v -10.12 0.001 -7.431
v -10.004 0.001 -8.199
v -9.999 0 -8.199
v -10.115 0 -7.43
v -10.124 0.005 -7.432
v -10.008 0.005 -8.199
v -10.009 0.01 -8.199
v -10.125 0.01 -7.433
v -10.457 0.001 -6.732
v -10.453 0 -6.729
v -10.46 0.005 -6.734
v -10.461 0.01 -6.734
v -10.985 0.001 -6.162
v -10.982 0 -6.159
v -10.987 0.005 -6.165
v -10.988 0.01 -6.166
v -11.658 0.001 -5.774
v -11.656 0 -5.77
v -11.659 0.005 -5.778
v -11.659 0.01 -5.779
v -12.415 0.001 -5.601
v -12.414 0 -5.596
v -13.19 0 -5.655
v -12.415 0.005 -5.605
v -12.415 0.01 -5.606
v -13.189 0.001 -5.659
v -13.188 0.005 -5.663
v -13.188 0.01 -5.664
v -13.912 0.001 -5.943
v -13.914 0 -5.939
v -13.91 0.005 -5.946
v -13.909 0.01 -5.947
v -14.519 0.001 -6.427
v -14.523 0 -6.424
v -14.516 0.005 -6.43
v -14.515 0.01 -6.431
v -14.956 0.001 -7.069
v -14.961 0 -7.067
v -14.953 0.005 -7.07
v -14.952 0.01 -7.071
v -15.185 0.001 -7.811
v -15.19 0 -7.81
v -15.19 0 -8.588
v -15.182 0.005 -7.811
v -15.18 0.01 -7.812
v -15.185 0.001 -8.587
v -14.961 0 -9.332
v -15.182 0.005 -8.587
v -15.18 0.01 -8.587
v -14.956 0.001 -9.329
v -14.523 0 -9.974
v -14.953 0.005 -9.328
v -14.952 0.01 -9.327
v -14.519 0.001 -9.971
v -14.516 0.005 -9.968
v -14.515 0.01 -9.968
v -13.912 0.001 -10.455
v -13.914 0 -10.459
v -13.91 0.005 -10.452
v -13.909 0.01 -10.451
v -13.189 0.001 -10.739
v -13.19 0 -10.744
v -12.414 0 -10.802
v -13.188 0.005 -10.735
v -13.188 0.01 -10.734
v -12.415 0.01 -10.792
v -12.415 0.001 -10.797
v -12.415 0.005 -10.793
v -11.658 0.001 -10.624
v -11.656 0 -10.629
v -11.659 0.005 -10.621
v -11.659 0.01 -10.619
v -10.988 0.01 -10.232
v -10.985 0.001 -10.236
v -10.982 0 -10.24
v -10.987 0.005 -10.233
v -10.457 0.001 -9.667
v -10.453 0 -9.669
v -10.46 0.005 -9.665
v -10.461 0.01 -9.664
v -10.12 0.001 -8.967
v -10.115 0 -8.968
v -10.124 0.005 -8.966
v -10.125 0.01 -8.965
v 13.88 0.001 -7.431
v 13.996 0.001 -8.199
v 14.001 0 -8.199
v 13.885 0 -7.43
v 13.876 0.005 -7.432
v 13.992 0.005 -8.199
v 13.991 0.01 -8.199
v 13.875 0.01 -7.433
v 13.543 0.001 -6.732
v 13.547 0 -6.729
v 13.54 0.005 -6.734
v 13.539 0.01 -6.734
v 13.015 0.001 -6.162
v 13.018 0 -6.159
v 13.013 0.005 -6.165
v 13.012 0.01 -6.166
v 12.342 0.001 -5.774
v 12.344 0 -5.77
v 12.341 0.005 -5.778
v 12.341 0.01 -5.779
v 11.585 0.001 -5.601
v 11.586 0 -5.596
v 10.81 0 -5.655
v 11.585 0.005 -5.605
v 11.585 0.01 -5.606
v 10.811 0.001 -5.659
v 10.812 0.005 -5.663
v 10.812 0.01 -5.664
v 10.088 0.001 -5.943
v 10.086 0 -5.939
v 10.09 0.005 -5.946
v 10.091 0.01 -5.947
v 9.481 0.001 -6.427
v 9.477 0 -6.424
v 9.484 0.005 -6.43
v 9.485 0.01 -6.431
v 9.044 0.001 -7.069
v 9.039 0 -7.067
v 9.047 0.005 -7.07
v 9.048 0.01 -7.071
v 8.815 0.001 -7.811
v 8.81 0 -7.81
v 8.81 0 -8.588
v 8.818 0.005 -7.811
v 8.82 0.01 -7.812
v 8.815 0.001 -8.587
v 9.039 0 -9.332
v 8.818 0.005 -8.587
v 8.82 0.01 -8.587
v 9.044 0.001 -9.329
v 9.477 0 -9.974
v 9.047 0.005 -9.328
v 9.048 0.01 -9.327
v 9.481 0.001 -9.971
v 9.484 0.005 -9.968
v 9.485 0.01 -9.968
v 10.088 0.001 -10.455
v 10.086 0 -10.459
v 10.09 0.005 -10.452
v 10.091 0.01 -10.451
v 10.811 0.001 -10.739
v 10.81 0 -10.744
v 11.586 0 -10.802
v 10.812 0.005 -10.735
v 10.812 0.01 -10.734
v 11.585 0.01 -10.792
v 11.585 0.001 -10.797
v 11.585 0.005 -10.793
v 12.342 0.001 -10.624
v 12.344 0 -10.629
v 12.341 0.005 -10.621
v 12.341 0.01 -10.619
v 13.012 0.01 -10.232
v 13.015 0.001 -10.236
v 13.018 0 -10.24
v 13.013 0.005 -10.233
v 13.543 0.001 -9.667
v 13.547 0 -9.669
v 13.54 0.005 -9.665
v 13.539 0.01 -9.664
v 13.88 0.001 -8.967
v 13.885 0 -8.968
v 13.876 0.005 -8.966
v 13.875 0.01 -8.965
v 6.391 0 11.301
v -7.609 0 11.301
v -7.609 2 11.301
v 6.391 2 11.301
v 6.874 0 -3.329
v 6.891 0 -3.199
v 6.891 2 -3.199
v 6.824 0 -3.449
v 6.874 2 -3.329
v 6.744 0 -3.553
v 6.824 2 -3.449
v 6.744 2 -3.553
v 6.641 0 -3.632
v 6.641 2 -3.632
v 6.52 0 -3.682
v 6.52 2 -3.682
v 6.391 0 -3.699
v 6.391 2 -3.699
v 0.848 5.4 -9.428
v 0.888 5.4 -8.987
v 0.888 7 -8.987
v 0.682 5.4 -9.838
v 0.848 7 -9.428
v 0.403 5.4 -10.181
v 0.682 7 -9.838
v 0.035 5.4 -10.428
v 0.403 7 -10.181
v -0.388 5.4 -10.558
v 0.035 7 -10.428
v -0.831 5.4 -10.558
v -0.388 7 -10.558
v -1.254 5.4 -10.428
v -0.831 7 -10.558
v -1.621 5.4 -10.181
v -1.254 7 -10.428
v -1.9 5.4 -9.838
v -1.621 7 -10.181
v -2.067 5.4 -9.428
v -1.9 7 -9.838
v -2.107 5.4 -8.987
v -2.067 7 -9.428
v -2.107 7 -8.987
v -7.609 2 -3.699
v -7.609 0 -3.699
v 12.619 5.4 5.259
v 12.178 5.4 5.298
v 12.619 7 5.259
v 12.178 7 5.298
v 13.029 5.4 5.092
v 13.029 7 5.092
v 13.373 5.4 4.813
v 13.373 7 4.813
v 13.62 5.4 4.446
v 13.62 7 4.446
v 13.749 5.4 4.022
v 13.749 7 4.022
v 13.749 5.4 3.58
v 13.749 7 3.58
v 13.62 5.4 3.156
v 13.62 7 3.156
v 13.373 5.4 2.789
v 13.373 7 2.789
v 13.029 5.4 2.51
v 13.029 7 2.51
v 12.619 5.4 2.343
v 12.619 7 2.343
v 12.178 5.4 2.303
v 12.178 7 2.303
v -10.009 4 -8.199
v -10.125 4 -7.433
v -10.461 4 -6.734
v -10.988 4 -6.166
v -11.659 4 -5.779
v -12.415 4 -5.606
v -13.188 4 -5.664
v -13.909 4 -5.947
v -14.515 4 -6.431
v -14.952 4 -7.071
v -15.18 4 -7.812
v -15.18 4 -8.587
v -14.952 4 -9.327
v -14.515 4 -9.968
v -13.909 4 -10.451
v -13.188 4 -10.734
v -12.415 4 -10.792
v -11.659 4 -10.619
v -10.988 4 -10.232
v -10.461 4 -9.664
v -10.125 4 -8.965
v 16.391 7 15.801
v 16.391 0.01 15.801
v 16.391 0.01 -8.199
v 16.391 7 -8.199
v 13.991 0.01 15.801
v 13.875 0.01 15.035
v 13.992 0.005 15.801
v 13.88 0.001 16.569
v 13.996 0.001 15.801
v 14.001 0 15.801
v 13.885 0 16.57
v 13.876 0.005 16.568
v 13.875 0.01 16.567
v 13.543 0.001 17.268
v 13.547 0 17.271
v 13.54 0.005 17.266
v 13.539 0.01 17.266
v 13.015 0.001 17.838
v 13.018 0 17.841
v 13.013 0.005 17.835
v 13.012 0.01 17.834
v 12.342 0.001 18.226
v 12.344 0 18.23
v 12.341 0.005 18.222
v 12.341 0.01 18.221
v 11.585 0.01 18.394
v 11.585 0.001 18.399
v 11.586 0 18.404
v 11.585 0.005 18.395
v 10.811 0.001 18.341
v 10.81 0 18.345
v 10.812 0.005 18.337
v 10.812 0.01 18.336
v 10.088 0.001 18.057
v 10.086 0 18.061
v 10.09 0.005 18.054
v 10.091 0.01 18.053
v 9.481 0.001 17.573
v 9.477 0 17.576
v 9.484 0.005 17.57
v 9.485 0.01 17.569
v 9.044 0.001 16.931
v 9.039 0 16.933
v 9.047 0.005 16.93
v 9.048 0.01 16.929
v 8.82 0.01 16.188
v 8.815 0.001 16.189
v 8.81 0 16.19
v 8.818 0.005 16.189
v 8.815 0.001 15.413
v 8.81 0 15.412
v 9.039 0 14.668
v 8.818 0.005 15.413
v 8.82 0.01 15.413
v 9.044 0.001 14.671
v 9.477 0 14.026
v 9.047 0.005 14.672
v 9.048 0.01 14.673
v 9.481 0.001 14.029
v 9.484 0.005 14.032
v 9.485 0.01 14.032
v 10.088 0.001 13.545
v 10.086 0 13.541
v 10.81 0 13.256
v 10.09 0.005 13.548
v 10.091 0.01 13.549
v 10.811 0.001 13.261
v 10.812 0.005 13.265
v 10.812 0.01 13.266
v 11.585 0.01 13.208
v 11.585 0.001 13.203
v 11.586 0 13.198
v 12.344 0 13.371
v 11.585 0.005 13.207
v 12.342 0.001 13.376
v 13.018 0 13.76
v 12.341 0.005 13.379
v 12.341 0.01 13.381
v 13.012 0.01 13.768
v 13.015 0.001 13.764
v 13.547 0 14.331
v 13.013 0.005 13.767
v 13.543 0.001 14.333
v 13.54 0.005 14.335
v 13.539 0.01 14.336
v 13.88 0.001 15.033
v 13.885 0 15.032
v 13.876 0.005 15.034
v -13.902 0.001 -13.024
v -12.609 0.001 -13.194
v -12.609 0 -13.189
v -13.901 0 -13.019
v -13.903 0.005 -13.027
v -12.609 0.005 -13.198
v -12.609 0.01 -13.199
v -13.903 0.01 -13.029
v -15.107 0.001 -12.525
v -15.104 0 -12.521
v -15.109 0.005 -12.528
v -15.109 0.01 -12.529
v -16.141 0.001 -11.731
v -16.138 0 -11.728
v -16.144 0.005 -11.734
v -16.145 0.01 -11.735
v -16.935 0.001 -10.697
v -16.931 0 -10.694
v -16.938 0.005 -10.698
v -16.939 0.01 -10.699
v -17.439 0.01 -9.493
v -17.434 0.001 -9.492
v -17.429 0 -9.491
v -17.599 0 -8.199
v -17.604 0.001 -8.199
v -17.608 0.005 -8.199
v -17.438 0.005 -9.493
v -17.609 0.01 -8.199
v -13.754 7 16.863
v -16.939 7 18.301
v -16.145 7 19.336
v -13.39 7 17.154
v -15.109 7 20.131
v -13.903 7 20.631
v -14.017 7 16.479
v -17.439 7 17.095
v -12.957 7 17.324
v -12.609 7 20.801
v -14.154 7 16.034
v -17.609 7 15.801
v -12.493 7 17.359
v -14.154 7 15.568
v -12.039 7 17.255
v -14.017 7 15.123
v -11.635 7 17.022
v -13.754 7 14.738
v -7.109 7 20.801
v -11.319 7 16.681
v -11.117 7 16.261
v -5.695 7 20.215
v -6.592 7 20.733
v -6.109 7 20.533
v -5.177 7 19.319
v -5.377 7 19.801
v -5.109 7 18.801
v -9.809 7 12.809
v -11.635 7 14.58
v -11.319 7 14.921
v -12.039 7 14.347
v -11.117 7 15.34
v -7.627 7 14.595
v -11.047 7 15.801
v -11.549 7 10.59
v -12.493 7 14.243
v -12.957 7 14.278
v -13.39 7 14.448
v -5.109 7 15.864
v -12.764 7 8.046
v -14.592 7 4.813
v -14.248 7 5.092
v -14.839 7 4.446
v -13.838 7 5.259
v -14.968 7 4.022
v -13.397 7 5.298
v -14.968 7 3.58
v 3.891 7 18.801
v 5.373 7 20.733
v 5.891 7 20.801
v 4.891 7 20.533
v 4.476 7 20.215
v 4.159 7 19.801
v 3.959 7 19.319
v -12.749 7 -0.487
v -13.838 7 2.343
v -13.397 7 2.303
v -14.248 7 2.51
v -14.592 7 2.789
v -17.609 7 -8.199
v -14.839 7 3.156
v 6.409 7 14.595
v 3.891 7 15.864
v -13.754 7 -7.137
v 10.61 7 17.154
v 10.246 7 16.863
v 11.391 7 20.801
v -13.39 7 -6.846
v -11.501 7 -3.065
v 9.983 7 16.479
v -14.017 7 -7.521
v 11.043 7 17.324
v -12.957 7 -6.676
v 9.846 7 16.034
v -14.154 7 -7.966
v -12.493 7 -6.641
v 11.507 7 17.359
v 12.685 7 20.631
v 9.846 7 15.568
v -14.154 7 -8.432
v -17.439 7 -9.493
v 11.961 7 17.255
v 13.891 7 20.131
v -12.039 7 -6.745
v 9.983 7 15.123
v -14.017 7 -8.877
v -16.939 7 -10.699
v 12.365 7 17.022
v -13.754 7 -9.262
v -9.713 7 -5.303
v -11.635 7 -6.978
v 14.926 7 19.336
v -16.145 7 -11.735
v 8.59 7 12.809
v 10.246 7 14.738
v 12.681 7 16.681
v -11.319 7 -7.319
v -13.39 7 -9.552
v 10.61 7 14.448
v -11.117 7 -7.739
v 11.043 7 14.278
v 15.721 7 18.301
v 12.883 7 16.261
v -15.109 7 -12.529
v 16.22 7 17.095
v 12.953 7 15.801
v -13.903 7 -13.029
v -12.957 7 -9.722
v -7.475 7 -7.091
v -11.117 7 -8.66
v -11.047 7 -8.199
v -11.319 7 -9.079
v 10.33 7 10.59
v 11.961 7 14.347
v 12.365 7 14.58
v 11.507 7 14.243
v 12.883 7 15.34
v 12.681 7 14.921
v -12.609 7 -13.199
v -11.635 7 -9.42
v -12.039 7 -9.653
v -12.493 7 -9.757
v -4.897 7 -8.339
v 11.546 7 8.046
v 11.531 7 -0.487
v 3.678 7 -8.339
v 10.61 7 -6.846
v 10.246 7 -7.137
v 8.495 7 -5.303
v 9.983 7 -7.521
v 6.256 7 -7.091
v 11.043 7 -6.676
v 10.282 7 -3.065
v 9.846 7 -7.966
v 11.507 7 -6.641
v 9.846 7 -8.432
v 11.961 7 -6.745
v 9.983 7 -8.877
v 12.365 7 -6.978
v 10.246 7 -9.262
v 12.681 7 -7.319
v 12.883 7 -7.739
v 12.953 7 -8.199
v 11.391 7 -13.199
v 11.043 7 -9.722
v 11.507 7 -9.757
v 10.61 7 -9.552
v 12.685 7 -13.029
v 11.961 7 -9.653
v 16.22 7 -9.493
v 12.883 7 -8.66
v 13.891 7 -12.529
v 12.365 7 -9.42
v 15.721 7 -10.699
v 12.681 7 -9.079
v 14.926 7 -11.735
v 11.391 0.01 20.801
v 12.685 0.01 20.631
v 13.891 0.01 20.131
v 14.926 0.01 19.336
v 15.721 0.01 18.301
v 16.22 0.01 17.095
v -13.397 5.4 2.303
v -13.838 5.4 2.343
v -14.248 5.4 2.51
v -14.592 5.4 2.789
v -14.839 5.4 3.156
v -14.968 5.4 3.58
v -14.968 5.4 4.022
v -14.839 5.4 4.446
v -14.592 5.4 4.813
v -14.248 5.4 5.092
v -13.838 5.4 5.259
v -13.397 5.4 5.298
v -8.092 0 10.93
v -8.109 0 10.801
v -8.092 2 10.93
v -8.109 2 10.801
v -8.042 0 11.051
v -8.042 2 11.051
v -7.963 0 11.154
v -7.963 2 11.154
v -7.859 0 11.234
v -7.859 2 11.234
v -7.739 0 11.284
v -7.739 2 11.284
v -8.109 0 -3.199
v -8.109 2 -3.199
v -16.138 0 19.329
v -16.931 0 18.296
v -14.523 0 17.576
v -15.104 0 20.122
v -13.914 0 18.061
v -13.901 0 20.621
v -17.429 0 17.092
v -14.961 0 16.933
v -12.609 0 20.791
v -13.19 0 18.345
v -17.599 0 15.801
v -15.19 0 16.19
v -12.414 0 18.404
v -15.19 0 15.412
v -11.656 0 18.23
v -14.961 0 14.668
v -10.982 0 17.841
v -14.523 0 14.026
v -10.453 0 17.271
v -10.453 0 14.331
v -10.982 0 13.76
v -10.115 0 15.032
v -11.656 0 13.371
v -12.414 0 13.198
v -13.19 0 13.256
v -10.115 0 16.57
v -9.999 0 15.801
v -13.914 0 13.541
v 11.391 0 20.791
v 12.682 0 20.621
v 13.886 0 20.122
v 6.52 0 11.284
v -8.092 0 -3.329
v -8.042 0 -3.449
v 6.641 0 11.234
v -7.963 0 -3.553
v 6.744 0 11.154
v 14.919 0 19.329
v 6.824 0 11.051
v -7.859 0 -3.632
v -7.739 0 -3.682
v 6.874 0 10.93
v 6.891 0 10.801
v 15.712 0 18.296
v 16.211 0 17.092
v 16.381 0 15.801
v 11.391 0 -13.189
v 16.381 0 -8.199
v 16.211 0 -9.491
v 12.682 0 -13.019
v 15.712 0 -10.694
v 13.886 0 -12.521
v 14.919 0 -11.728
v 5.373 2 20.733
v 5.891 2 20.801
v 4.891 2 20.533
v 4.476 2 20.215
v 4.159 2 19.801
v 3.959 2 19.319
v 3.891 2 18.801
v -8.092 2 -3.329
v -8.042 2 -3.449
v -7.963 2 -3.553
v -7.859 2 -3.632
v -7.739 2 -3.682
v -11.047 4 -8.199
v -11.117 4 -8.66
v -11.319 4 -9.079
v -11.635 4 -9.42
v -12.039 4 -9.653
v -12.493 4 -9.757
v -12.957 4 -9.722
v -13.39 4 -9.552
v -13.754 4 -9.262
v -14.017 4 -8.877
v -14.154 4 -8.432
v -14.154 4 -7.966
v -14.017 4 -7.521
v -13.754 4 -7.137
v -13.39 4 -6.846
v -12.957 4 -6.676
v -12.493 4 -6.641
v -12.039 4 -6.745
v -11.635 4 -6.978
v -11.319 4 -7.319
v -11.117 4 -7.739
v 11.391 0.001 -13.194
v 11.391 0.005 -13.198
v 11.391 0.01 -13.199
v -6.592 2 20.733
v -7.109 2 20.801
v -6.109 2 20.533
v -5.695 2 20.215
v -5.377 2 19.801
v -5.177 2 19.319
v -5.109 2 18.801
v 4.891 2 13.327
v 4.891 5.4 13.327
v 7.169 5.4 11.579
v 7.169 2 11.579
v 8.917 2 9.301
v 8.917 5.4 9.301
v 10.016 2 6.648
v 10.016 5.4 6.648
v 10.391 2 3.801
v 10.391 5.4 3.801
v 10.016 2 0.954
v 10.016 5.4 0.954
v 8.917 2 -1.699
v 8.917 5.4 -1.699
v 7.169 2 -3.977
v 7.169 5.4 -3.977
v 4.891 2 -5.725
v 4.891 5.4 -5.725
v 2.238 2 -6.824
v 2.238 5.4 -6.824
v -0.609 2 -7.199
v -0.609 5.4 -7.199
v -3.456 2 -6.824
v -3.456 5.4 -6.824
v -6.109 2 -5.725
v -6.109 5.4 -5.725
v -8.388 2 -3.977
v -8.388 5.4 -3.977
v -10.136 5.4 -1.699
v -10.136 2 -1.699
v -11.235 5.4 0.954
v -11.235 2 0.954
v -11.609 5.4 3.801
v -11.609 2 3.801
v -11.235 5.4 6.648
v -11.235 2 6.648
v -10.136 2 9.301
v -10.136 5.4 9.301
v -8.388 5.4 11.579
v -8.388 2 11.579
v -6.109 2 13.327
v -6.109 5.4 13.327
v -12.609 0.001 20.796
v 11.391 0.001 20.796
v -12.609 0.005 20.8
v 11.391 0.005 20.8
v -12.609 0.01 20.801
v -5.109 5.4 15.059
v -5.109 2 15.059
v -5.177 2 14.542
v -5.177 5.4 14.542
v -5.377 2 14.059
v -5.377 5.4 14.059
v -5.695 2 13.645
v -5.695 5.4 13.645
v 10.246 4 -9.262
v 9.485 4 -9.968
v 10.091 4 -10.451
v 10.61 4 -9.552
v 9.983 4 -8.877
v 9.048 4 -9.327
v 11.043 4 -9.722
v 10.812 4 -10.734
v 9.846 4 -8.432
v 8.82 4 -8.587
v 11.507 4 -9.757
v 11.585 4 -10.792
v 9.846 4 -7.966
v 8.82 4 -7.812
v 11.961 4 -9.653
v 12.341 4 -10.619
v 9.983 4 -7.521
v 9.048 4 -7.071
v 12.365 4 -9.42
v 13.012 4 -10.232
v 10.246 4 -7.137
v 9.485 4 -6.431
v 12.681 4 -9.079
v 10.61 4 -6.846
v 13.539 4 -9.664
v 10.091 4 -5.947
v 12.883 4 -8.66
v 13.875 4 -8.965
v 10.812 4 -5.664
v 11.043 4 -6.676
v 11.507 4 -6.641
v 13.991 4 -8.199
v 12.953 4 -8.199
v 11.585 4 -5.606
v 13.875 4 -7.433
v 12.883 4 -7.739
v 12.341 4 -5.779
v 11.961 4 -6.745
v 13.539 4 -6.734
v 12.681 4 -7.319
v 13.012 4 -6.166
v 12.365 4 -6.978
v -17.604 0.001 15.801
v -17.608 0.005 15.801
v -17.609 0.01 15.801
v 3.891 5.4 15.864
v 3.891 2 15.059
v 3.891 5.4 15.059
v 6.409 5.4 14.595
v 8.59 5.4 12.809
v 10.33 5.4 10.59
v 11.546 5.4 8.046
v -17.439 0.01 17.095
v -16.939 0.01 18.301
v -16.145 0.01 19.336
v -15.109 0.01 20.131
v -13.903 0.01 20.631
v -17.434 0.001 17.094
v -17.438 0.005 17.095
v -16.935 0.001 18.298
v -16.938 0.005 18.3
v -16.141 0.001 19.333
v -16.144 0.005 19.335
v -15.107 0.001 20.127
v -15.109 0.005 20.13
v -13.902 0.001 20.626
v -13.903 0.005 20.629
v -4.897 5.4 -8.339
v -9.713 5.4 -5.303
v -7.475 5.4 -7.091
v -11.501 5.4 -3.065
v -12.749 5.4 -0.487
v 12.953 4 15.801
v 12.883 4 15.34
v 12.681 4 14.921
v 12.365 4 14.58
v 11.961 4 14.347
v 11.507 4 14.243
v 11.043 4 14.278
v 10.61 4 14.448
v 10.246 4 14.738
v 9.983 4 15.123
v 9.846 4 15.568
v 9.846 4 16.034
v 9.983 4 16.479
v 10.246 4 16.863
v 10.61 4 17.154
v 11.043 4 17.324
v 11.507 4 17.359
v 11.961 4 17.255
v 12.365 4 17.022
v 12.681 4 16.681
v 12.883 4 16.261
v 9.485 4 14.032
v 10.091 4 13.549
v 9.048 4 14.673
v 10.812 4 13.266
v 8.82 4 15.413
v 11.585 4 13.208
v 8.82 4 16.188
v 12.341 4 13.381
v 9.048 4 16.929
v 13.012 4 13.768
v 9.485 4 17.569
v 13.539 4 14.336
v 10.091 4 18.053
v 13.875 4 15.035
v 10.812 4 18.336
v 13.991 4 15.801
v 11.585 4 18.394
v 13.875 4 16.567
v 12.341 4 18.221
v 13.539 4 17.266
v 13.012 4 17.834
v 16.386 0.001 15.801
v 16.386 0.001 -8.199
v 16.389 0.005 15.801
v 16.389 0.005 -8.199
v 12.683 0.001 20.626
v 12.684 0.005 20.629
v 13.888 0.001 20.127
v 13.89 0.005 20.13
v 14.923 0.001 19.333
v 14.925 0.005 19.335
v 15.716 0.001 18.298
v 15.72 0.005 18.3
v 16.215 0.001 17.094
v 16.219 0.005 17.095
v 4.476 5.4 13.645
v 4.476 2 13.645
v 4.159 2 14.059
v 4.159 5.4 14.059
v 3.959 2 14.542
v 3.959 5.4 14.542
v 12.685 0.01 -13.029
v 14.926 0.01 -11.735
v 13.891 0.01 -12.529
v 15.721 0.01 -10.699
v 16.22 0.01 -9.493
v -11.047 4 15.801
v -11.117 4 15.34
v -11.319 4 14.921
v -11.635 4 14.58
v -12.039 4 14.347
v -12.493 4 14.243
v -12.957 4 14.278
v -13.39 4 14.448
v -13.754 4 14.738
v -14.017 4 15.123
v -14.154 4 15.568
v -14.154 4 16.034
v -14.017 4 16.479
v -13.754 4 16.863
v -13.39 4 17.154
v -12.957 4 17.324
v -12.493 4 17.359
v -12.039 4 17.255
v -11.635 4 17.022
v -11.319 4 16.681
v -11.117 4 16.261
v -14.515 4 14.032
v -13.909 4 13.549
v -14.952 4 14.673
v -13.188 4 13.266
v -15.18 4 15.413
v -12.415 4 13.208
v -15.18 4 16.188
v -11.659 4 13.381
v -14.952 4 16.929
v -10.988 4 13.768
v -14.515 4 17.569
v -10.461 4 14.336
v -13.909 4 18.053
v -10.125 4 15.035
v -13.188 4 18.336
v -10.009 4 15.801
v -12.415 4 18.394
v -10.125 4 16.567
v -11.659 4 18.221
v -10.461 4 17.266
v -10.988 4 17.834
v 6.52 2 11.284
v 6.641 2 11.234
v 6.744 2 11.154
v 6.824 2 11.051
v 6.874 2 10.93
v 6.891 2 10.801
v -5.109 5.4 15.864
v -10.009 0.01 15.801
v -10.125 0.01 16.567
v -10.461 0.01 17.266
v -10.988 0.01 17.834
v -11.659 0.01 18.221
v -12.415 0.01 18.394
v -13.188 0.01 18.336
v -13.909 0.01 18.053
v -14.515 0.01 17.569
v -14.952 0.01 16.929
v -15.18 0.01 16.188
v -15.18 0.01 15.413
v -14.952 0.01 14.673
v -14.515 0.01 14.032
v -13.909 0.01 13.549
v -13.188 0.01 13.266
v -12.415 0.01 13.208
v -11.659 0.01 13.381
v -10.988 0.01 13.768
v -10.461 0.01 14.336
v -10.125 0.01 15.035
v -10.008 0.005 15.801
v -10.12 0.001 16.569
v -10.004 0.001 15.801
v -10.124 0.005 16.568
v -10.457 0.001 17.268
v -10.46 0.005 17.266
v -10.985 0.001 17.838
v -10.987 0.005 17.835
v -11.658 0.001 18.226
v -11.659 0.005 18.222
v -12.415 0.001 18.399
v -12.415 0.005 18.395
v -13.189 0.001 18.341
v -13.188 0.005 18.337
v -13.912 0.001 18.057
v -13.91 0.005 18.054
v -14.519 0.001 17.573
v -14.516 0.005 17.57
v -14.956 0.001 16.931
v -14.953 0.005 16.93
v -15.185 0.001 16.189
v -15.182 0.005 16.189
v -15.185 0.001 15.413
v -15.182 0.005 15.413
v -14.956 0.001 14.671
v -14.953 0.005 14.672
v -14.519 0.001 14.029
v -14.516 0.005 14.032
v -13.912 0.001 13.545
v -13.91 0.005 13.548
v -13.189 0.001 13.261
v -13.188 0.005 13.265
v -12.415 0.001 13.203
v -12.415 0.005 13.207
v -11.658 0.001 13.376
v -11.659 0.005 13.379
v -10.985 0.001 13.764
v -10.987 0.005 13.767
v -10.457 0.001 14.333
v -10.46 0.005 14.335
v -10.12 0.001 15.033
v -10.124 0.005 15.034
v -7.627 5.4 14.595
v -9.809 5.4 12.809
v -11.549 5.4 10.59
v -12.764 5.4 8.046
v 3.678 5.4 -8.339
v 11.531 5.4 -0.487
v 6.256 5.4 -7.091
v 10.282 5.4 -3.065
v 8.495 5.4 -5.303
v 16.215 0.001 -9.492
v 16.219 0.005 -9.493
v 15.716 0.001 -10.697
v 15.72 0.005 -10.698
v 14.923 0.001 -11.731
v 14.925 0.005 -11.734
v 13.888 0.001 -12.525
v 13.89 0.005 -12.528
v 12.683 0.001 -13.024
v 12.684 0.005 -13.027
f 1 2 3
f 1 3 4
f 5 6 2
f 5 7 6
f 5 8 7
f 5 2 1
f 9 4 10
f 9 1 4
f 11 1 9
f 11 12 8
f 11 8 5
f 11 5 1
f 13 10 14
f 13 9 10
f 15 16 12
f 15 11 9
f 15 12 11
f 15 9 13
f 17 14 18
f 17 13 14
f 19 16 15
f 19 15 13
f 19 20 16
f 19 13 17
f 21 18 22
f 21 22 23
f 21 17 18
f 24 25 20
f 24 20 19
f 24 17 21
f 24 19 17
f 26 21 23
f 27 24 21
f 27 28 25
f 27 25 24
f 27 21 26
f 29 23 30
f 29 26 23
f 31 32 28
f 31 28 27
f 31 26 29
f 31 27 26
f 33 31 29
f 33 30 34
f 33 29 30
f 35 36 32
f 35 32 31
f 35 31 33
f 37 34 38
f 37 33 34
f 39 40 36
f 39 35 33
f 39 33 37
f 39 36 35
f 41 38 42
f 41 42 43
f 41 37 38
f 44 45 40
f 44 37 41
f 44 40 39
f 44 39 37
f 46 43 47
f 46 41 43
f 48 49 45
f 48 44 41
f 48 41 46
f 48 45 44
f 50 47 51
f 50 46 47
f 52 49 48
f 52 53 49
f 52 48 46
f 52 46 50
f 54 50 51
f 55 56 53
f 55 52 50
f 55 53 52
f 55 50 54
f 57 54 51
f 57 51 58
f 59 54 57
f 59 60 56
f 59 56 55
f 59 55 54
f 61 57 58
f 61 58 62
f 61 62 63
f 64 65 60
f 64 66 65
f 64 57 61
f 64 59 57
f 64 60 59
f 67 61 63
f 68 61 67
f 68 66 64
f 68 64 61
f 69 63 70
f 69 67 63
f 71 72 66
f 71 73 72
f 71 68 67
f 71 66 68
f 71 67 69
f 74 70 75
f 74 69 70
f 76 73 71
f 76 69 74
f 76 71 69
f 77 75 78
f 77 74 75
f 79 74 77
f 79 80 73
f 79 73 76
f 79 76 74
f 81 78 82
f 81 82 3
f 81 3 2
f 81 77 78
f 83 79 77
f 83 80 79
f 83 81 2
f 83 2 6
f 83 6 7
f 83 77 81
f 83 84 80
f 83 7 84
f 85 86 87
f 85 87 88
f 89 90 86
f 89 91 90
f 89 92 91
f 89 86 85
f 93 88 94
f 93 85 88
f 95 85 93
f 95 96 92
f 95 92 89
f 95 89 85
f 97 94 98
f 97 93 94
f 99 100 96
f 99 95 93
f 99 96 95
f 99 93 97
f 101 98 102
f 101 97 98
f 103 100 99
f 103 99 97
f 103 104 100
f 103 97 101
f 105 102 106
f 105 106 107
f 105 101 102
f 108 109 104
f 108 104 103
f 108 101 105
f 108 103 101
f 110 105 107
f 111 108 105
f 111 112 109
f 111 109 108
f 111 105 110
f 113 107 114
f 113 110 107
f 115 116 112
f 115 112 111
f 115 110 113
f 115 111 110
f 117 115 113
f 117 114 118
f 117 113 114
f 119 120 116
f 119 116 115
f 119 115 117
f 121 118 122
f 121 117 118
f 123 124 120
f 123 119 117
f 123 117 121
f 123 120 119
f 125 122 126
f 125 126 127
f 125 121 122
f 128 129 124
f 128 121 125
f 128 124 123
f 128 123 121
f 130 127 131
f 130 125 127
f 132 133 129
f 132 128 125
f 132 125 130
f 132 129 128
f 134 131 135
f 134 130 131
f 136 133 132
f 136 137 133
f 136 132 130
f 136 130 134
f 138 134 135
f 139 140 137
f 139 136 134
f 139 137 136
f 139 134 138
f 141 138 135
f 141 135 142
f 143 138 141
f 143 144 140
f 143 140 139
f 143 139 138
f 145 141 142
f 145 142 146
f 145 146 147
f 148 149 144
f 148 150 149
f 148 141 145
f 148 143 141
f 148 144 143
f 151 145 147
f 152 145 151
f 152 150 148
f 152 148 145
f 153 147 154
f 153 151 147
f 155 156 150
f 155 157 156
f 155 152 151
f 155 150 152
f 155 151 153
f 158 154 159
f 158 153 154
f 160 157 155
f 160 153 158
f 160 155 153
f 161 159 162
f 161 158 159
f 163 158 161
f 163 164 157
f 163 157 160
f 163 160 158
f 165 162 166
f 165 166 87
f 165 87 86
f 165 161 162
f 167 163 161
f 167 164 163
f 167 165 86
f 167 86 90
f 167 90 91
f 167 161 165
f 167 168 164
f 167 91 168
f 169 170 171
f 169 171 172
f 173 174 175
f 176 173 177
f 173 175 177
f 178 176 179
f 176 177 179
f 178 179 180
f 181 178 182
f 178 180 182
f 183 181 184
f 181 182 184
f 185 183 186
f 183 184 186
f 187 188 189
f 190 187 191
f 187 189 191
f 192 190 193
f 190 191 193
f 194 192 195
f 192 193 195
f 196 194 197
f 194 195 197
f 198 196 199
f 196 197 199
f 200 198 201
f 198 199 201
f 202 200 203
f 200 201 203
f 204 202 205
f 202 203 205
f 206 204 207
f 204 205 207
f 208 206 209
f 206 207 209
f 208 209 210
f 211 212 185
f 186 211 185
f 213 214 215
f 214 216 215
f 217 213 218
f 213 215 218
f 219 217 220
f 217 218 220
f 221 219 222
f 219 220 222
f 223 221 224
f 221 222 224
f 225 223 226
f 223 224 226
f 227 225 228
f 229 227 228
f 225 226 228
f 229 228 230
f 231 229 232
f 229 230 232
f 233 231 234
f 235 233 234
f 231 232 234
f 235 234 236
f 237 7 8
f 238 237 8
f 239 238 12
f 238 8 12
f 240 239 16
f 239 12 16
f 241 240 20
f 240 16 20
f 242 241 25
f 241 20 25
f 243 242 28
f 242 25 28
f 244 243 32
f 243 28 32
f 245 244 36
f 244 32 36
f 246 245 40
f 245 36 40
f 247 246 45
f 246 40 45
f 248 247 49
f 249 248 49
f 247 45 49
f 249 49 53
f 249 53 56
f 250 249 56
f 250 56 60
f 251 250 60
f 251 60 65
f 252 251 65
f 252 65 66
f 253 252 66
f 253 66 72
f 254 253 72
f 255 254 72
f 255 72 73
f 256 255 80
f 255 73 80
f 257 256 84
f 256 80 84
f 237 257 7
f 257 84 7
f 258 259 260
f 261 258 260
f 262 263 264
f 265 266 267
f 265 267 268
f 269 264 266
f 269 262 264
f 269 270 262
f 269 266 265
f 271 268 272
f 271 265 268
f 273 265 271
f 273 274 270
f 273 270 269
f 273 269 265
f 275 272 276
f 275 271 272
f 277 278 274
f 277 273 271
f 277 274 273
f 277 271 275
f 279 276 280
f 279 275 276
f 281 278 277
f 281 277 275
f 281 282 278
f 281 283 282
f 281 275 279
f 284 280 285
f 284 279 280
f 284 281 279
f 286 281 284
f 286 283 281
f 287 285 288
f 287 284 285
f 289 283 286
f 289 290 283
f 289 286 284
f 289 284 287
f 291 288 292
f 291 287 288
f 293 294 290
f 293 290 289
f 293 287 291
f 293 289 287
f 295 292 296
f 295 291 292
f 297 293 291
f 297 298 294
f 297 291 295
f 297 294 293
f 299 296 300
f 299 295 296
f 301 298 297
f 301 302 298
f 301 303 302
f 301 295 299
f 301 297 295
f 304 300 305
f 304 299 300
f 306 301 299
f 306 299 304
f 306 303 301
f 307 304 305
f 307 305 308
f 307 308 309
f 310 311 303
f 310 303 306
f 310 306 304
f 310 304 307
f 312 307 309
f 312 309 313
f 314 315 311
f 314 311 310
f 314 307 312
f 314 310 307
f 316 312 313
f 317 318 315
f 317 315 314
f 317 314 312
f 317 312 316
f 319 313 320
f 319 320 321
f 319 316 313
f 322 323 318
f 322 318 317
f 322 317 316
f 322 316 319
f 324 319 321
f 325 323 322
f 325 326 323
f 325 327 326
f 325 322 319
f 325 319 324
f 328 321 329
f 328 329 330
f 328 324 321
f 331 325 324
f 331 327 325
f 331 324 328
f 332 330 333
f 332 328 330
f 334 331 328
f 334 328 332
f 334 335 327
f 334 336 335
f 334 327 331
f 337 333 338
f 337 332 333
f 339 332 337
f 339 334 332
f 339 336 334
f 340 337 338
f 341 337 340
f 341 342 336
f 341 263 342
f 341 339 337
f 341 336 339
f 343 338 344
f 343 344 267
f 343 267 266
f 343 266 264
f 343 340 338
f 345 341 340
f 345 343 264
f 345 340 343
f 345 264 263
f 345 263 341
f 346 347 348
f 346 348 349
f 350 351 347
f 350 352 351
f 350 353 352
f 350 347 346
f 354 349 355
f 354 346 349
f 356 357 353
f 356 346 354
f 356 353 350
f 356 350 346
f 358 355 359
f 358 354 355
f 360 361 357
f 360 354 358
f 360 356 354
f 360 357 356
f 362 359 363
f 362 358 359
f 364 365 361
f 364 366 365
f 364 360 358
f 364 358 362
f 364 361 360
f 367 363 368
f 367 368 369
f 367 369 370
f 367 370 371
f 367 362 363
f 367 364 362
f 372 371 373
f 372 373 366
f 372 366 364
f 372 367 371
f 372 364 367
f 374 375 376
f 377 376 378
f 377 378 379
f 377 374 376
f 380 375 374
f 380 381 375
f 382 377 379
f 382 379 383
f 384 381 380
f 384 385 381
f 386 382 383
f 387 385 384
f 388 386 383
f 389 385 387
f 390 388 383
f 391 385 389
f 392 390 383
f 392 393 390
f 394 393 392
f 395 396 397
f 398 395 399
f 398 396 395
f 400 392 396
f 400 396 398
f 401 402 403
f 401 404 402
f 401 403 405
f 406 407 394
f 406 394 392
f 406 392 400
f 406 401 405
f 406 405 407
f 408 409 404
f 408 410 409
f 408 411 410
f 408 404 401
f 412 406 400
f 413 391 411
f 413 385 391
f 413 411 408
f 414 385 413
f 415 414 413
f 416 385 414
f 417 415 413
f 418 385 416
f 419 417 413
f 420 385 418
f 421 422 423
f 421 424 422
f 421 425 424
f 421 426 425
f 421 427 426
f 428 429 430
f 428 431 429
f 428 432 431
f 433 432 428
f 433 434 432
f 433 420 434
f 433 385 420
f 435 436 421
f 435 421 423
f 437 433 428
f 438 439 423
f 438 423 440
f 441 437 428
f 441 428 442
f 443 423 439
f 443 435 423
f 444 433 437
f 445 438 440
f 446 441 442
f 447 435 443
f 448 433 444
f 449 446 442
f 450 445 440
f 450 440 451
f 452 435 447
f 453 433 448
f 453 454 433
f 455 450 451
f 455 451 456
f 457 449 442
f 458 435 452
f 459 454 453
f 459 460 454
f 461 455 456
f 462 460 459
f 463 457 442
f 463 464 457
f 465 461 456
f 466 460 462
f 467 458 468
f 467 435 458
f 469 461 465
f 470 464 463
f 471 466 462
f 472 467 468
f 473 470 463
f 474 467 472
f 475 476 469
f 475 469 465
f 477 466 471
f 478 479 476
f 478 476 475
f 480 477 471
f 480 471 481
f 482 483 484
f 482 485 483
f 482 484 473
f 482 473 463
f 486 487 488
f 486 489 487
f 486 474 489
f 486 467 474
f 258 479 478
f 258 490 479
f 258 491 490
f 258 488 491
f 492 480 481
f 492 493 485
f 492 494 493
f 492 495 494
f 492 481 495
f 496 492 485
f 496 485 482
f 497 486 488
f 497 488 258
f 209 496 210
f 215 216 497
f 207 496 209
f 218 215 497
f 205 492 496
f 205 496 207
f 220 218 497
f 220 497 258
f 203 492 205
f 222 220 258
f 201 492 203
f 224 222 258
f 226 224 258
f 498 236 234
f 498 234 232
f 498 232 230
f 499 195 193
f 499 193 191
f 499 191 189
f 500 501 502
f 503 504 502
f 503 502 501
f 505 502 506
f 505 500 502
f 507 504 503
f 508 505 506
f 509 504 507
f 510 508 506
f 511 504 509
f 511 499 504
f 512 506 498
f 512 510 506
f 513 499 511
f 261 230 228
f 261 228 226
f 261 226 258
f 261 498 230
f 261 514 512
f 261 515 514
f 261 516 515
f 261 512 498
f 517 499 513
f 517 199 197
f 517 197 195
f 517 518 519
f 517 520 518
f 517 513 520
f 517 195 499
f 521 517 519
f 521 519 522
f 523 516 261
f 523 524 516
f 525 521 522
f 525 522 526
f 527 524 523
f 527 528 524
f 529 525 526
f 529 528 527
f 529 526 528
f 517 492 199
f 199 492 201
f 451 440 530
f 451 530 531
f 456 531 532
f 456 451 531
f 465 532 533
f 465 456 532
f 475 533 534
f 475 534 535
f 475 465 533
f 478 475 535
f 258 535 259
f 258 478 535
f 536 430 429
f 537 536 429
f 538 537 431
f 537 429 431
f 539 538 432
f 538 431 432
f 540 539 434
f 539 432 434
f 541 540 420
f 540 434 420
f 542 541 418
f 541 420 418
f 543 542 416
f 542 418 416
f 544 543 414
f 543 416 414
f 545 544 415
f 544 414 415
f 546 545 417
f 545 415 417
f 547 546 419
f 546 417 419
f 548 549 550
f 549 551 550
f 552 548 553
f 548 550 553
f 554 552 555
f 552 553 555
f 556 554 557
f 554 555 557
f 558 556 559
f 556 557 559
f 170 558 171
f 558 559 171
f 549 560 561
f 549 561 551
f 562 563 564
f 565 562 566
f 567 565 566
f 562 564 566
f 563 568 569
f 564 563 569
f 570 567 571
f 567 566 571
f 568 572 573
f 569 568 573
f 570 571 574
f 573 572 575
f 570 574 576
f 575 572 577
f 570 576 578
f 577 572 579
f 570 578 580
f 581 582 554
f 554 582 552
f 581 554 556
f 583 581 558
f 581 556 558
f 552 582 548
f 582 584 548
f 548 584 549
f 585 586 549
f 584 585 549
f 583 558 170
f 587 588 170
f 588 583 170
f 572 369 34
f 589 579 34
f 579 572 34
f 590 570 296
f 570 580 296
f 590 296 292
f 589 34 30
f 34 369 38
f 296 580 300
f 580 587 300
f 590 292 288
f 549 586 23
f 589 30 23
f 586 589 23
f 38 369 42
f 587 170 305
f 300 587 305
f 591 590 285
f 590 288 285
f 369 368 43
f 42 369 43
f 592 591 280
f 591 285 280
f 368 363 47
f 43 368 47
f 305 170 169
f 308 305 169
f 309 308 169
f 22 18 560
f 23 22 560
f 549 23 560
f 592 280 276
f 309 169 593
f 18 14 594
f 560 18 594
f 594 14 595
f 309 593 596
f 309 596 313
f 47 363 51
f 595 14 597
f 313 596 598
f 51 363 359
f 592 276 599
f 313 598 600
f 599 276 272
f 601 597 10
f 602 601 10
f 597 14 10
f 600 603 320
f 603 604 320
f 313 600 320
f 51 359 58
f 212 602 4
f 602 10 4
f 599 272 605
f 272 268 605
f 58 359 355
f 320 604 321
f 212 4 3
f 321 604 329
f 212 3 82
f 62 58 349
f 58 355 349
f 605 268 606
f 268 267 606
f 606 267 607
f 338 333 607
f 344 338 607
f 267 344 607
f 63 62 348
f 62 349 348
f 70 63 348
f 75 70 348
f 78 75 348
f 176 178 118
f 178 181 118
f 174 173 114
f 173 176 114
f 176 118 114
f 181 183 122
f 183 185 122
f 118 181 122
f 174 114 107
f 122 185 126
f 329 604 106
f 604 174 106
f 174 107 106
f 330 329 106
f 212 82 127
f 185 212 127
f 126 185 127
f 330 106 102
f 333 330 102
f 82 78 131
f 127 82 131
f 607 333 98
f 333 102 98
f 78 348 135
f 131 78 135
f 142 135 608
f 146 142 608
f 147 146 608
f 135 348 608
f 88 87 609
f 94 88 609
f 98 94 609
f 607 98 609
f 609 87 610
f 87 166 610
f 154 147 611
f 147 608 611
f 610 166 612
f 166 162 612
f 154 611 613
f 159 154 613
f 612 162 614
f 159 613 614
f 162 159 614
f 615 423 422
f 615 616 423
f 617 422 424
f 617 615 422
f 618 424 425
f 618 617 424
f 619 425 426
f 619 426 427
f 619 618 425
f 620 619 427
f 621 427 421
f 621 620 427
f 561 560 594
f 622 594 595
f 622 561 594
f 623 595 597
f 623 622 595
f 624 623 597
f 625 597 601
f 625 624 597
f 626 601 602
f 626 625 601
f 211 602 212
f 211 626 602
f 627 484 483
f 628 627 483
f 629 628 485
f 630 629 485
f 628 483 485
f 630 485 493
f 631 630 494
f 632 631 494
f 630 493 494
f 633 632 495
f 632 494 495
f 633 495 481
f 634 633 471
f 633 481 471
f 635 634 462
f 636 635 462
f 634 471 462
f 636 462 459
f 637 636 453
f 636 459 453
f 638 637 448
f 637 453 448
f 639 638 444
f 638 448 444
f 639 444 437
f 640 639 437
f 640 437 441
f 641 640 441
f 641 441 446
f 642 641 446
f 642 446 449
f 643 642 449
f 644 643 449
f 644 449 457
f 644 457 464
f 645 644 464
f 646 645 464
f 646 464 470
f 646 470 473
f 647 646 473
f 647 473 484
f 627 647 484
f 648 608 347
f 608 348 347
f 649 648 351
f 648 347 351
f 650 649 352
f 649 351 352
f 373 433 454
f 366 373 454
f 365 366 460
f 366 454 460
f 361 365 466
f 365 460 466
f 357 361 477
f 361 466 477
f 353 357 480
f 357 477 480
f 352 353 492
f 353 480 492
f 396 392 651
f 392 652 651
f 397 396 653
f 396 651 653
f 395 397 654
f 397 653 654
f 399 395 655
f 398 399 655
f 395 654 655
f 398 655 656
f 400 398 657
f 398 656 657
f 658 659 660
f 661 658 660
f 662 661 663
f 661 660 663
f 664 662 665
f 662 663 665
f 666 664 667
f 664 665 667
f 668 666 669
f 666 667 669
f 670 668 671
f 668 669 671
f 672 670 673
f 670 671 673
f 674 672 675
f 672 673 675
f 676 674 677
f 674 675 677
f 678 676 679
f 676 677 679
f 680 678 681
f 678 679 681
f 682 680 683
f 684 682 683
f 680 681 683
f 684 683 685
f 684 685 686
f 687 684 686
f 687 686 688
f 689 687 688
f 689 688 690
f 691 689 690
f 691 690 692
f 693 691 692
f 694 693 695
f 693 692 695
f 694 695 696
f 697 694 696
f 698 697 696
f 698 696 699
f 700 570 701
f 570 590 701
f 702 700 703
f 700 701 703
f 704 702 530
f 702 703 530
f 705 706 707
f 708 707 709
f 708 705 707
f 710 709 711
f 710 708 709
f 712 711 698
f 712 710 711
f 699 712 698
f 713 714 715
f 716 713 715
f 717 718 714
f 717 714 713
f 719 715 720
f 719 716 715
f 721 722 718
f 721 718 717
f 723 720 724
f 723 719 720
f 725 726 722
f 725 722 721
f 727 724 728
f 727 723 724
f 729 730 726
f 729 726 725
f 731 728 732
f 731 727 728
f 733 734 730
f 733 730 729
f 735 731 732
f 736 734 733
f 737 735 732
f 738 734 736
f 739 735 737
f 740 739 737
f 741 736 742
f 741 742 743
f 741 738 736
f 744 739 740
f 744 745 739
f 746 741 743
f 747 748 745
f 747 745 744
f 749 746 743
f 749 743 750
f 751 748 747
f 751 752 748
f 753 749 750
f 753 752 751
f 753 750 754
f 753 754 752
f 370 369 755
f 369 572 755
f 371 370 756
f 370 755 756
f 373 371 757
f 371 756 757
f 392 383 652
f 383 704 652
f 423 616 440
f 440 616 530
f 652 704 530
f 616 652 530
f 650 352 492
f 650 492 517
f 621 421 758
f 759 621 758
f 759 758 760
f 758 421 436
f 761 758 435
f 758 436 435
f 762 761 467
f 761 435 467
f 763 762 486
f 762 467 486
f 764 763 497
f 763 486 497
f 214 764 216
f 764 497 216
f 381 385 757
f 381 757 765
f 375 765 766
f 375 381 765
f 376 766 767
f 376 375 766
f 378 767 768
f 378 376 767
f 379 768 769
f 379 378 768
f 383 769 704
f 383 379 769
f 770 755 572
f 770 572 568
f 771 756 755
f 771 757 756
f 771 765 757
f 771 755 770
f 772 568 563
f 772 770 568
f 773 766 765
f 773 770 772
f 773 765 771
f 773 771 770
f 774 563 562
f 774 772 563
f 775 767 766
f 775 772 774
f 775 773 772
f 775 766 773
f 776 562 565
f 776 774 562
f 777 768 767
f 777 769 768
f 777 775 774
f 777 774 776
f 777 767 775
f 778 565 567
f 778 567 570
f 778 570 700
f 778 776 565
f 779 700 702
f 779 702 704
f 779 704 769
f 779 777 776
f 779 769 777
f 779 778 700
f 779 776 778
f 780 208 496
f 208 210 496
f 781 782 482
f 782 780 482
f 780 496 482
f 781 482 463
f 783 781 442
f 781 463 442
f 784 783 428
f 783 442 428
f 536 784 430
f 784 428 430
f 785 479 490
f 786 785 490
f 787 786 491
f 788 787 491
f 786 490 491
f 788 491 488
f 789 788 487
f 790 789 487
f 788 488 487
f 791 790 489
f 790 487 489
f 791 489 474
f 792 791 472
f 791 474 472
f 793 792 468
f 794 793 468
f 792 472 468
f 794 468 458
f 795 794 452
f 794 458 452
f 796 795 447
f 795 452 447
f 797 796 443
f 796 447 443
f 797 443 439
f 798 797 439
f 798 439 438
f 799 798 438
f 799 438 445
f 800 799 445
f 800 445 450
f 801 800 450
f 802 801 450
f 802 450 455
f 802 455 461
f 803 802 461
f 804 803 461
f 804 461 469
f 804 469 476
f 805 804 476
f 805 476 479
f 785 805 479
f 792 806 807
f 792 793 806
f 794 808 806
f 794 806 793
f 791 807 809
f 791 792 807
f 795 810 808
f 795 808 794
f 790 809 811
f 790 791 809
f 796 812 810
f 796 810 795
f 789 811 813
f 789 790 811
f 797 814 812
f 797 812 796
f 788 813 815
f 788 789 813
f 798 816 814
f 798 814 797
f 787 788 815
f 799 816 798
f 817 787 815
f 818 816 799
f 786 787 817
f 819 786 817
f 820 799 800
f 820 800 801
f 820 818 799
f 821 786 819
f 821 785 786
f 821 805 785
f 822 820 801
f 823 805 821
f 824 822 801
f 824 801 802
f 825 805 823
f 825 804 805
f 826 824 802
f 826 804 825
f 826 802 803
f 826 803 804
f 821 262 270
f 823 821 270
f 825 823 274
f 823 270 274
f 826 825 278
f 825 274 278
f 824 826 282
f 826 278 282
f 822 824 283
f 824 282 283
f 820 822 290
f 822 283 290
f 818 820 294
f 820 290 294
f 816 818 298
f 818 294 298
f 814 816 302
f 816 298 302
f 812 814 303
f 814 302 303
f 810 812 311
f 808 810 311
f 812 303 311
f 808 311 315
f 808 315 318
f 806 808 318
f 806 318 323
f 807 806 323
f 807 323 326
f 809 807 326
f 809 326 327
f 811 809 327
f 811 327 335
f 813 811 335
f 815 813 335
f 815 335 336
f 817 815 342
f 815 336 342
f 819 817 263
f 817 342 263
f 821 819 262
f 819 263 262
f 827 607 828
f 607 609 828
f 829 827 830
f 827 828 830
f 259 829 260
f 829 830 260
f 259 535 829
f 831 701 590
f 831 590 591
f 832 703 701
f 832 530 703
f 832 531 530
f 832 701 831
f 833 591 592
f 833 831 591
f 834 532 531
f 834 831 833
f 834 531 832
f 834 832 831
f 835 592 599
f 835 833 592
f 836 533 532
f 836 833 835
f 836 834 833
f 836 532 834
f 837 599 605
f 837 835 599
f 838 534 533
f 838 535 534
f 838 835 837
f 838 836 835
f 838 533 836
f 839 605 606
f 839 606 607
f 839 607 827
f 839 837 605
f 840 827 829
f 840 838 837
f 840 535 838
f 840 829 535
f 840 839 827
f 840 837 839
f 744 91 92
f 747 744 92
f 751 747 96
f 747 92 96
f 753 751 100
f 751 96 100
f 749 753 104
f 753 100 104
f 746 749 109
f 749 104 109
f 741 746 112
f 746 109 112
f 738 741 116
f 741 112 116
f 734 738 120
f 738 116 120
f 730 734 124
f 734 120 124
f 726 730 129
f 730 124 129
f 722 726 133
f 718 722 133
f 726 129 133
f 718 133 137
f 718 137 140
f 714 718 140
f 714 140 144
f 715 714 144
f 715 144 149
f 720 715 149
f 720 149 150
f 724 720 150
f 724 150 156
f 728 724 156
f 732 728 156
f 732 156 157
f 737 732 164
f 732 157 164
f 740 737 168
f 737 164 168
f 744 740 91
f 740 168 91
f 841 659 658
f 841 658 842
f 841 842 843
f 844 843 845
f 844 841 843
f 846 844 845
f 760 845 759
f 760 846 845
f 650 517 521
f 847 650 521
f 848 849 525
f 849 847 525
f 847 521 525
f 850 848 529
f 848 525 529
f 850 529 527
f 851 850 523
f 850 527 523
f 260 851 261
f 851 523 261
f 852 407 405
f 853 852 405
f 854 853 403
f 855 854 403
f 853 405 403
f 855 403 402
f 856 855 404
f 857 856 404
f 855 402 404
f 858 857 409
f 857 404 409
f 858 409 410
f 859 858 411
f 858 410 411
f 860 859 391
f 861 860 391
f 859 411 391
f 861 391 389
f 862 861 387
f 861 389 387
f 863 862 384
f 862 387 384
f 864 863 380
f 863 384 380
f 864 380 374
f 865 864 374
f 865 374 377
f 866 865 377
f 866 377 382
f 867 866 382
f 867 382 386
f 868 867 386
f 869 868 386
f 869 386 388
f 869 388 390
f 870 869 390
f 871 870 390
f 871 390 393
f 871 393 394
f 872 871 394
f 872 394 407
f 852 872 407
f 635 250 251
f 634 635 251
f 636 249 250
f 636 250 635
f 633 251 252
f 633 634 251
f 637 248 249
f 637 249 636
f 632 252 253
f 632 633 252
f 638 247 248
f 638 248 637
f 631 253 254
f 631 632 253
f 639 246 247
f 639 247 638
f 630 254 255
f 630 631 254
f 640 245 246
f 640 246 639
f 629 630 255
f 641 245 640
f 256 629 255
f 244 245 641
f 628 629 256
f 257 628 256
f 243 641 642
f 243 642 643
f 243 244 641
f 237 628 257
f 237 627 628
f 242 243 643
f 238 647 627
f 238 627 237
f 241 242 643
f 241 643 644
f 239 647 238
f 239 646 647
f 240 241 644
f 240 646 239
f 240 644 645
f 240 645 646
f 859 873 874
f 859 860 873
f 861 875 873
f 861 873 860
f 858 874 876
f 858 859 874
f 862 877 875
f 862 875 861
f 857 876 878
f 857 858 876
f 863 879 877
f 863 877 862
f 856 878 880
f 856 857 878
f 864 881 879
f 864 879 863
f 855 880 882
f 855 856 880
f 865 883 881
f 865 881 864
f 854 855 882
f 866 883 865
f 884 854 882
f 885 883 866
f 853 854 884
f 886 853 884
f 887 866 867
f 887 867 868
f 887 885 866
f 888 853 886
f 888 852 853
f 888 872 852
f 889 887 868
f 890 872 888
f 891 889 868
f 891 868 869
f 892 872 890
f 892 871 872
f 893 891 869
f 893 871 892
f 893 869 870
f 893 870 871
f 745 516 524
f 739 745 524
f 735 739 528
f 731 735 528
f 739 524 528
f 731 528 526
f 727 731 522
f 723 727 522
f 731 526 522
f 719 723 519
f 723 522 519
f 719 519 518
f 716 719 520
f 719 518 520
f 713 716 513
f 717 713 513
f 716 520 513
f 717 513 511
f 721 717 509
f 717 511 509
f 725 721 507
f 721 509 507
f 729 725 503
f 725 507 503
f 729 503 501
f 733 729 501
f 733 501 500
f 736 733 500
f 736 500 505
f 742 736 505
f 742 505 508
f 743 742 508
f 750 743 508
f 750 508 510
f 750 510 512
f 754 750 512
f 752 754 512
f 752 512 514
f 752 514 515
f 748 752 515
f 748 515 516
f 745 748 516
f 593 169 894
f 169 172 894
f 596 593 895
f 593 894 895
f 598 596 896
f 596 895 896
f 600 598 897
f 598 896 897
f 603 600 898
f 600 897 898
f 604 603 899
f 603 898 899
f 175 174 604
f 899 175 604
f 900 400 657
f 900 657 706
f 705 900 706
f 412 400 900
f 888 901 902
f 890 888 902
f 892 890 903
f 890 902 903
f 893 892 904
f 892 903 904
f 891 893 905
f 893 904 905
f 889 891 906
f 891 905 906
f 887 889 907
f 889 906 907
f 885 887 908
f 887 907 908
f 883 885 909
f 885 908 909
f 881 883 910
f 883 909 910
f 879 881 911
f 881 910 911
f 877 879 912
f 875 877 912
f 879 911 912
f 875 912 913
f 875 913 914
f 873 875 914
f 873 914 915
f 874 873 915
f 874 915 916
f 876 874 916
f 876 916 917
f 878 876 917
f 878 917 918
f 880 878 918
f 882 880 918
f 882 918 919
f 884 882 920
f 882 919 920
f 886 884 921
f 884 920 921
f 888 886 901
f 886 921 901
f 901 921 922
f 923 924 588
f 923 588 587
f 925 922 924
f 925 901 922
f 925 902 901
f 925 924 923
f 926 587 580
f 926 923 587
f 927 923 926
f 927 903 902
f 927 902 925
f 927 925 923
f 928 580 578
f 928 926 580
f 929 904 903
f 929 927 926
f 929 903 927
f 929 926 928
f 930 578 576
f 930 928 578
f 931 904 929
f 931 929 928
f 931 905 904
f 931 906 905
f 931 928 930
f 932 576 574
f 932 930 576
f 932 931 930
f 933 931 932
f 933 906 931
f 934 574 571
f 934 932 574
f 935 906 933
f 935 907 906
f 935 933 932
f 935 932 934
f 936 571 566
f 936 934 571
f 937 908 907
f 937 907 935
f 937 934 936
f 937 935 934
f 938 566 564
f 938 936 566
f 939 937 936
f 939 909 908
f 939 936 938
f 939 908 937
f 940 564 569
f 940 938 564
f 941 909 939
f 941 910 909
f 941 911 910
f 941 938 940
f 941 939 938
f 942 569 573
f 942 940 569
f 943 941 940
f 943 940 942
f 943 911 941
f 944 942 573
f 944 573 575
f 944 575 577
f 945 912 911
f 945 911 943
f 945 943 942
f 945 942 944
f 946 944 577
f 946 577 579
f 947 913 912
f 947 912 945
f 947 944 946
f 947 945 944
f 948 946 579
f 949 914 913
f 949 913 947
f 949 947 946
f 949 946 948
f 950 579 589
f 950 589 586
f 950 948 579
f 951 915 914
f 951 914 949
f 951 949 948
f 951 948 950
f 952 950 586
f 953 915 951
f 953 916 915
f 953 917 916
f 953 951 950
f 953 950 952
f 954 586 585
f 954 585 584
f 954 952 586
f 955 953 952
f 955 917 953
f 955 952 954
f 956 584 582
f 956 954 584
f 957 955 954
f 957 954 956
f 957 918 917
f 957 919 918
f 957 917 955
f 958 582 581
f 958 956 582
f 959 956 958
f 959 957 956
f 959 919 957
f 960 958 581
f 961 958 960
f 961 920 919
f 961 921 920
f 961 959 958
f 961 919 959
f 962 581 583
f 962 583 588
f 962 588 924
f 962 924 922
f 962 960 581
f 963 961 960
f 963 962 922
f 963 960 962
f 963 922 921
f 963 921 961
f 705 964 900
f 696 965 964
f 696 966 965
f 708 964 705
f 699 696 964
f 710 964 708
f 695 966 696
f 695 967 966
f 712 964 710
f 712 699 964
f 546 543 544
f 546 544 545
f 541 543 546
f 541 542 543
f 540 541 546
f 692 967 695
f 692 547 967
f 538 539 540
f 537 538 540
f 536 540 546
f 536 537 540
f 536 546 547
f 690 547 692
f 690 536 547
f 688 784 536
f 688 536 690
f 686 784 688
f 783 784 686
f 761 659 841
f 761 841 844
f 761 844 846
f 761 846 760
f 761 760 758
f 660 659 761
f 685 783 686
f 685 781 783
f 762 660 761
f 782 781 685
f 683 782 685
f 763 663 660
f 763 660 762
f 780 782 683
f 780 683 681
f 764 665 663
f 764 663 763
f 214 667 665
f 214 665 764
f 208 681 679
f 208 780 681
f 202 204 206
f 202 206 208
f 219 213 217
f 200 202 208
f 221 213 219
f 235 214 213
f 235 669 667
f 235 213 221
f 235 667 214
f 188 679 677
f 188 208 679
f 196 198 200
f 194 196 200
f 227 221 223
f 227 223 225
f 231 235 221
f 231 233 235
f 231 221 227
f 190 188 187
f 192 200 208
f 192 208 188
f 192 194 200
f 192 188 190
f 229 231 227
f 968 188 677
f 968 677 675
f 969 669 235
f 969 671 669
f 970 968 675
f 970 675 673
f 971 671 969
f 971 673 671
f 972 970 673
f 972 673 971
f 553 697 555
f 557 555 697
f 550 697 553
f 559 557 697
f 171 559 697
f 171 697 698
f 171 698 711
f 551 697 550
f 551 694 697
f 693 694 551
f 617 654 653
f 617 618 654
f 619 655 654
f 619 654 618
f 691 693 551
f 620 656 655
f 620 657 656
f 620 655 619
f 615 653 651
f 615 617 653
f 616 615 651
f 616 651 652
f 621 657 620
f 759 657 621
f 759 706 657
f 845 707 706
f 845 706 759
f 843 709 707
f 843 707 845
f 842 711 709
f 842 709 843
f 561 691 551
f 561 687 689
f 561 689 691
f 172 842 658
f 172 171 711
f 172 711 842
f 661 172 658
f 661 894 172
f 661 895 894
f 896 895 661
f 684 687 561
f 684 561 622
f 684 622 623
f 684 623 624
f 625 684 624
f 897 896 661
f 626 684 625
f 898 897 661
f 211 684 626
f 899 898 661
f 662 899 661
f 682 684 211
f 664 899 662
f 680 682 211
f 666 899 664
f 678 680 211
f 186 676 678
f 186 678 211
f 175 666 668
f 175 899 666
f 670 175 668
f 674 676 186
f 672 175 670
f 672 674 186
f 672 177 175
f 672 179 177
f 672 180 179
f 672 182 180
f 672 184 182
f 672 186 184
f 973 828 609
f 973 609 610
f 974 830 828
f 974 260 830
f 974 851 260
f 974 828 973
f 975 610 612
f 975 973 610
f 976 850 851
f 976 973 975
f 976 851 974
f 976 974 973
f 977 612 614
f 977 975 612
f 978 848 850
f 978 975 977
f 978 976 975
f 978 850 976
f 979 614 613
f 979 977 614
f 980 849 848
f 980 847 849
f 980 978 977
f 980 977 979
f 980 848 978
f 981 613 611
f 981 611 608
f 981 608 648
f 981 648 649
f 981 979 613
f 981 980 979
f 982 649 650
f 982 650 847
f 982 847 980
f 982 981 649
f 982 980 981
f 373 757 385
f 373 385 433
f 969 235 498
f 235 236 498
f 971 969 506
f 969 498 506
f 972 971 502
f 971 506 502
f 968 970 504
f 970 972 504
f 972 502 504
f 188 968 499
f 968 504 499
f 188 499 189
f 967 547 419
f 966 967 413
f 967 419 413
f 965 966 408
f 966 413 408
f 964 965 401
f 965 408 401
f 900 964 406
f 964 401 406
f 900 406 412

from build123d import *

# Parameters (mm, degrees)
SKETCH1_W           = 34
SKETCH1_H           = 34
BOSS_EXTRUDE1_DEPTH = 7
SKETCH2_R           = 11
CUT_EXTRUDE1_DEPTH  = 5
SKETCH3_R           = 1.5621
CUT_EXTRUDE2_DEPTH  = 8
SKETCH4_W           = 9
SKETCH4_H           = 12.899537492
CUT_EXTRUDE3_DEPTH  = 5
SKETCH5_R           = 2.6
CUT_EXTRUDE4_DEPTH  = 4
FILLET1_R           = 5
FILLET2_R           = 0.01
FILLET3_R           = 2
SKETCH6_W           = 15
SKETCH6_H           = 15
CUT_EXTRUDE5_DEPTH  = 2
FILLET6_R           = 0.5
SKETCH8_R           = 12.875
CUT_EXTRUDE6_DEPTH  = 1.6
SKETCH9_R           = 1.5
CUT_EXTRUDE7_DEPTH  = 1.6


with BuildPart() as part:
    # Sketch1 → Boss-Extrude1 (new body)
    with BuildSketch(Plane(origin=(0, 0, 0), x_dir=(1, 0, 0), z_dir=(0, 1, 0))):
        with Locations((-0.609342113, -3.800882142)):
            Rectangle(SKETCH1_W, SKETCH1_H)
    extrude(amount=BOSS_EXTRUDE1_DEPTH)

    # Sketch2 → Cut-Extrude1 (cut)
    with BuildSketch(Plane(origin=(0, 7, 0), x_dir=(1, 0, 0), z_dir=(0, 1, 0))):
        with Locations((-0.609342113, -3.800882142)):
            Circle(SKETCH2_R)
    extrude(amount=-CUT_EXTRUDE1_DEPTH, mode=Mode.SUBTRACT)

    # Sketch3 → Cut-Extrude2 (cut, through all)
    with BuildSketch(Plane(origin=(0, 7, 0), x_dir=(1, 0, 0), z_dir=(0, 1, 0))):
        with Locations((-12.609342113, 8.199117858)):
            Circle(SKETCH3_R)
        with Locations((-12.609342113, -15.800882142)):
            Circle(SKETCH3_R)
        with Locations((11.390657887, -15.800882142)):
            Circle(SKETCH3_R)
        with Locations((11.390657887, 8.199117858)):
            Circle(SKETCH3_R)
    extrude(amount=-CUT_EXTRUDE2_DEPTH, mode=Mode.SUBTRACT)

    # Sketch4 → Cut-Extrude3 (cut)
    with BuildSketch(Plane(origin=(0, 7, 0), x_dir=(1, 0, 0), z_dir=(0, 1, 0))):
        with Locations((-0.609342113, -16.792376967)):
            Rectangle(SKETCH4_W, SKETCH4_H)
    extrude(amount=-CUT_EXTRUDE3_DEPTH, mode=Mode.SUBTRACT)

    # Sketch5 → Cut-Extrude4 (cut)
    with BuildSketch(Plane.XZ):
        with Locations((-12.609342113, 15.800882142)):
            Circle(SKETCH5_R)
        with Locations((11.390657887, 15.800882142)):
            Circle(SKETCH5_R)
        with Locations((-12.609342113, -8.199117858)):
            Circle(SKETCH5_R)
        with Locations((11.390657887, -8.199117858)):
            Circle(SKETCH5_R)
    extrude(amount=-CUT_EXTRUDE4_DEPTH, mode=Mode.SUBTRACT)

    # Fillet1
    fillet1_edges = [part.edges().sort_by_distance(p)[0] for p in [
        (-17.609342113, 3.5, -13.199117858),
        (16.390657887, 3.5, -13.199117858),
        (16.390657887, 3.5, 20.800882142),
        (-17.609342113, 3.5, 20.800882142),
    ]]
    fillet(fillet1_edges, radius=FILLET1_R)

    # Fillet2
    fillet2_edges = [part.edges().sort_by_distance(p)[0] for p in [
        (-15.209342113, 0, 15.800882142),
        (8.790657887, 0, 15.800882142),
        (-15.209342113, 0, -8.199117858),
        (8.790657887, 0, -8.199117858),
        (16.390657887, 0, 3.800882142),
        (-17.609342113, 0, 3.800882142),
        (-0.609342113, 0, -13.199117858),
        (-0.609342113, 0, 20.800882142),
        (-16.144876019, 0, 19.336416048),
        (-16.144876019, 0, -11.734651764),
        (14.926191793, 0, -11.734651764),
        (14.926191793, 0, 19.336416048),
    ]]
    fillet(fillet2_edges, radius=FILLET2_R)

    # Fillet3
    fillet3_edges = [part.edges().sort_by_distance(p)[0] for p in [
        (-5.109342113, 4.5, 20.800882142),
        (-5.109342113, 4.5, 13.838312092),
        (3.890657887, 4.5, 20.800882142),
        (3.890657887, 4.5, 13.838312092),
    ]]
    fillet(fillet3_edges, radius=FILLET3_R)

    # Sketch6 → Cut-Extrude5 (cut)
    with BuildSketch(Plane.XZ):
        with Locations((-0.609342113, 3.800882142)):
            Rectangle(SKETCH6_W, SKETCH6_H)
    extrude(amount=-CUT_EXTRUDE5_DEPTH, mode=Mode.SUBTRACT)

    # Fillet6
    fillet6_edges = [part.edges().sort_by_distance(p)[0] for p in [
        (-8.109342113, 1, -3.699117858),
        (-8.109342113, 1, 11.300882142),
        (6.890657887, 1, 11.300882142),
        (6.890657887, 1, -3.699117858),
    ]]
    fillet(fillet6_edges, radius=FILLET6_R)

    # Sketch8 → Cut-Extrude6 (cut)
    with BuildSketch(Plane(origin=(0, 7, 0), x_dir=(1, 0, 0), z_dir=(0, 1, 0))):
        with Locations((-0.609342113, -3.800882142)):
            Circle(SKETCH8_R)
    extrude(amount=-CUT_EXTRUDE6_DEPTH, mode=Mode.SUBTRACT)

    # Sketch9 → Cut-Extrude7 (cut)
    with BuildSketch(Plane(origin=(0, 7, 0), x_dir=(1, 0, 0), z_dir=(0, 1, 0))):
        with Locations((-0.609342113, 9.074117858)):
            Circle(SKETCH9_R)
        with Locations((12.265657887, -3.800882142)):
            Circle(SKETCH9_R)
        with Locations((-13.484342113, -3.800882142)):
            Circle(SKETCH9_R)
    extrude(amount=-CUT_EXTRUDE7_DEPTH, mode=Mode.SUBTRACT)


solid = part.part
